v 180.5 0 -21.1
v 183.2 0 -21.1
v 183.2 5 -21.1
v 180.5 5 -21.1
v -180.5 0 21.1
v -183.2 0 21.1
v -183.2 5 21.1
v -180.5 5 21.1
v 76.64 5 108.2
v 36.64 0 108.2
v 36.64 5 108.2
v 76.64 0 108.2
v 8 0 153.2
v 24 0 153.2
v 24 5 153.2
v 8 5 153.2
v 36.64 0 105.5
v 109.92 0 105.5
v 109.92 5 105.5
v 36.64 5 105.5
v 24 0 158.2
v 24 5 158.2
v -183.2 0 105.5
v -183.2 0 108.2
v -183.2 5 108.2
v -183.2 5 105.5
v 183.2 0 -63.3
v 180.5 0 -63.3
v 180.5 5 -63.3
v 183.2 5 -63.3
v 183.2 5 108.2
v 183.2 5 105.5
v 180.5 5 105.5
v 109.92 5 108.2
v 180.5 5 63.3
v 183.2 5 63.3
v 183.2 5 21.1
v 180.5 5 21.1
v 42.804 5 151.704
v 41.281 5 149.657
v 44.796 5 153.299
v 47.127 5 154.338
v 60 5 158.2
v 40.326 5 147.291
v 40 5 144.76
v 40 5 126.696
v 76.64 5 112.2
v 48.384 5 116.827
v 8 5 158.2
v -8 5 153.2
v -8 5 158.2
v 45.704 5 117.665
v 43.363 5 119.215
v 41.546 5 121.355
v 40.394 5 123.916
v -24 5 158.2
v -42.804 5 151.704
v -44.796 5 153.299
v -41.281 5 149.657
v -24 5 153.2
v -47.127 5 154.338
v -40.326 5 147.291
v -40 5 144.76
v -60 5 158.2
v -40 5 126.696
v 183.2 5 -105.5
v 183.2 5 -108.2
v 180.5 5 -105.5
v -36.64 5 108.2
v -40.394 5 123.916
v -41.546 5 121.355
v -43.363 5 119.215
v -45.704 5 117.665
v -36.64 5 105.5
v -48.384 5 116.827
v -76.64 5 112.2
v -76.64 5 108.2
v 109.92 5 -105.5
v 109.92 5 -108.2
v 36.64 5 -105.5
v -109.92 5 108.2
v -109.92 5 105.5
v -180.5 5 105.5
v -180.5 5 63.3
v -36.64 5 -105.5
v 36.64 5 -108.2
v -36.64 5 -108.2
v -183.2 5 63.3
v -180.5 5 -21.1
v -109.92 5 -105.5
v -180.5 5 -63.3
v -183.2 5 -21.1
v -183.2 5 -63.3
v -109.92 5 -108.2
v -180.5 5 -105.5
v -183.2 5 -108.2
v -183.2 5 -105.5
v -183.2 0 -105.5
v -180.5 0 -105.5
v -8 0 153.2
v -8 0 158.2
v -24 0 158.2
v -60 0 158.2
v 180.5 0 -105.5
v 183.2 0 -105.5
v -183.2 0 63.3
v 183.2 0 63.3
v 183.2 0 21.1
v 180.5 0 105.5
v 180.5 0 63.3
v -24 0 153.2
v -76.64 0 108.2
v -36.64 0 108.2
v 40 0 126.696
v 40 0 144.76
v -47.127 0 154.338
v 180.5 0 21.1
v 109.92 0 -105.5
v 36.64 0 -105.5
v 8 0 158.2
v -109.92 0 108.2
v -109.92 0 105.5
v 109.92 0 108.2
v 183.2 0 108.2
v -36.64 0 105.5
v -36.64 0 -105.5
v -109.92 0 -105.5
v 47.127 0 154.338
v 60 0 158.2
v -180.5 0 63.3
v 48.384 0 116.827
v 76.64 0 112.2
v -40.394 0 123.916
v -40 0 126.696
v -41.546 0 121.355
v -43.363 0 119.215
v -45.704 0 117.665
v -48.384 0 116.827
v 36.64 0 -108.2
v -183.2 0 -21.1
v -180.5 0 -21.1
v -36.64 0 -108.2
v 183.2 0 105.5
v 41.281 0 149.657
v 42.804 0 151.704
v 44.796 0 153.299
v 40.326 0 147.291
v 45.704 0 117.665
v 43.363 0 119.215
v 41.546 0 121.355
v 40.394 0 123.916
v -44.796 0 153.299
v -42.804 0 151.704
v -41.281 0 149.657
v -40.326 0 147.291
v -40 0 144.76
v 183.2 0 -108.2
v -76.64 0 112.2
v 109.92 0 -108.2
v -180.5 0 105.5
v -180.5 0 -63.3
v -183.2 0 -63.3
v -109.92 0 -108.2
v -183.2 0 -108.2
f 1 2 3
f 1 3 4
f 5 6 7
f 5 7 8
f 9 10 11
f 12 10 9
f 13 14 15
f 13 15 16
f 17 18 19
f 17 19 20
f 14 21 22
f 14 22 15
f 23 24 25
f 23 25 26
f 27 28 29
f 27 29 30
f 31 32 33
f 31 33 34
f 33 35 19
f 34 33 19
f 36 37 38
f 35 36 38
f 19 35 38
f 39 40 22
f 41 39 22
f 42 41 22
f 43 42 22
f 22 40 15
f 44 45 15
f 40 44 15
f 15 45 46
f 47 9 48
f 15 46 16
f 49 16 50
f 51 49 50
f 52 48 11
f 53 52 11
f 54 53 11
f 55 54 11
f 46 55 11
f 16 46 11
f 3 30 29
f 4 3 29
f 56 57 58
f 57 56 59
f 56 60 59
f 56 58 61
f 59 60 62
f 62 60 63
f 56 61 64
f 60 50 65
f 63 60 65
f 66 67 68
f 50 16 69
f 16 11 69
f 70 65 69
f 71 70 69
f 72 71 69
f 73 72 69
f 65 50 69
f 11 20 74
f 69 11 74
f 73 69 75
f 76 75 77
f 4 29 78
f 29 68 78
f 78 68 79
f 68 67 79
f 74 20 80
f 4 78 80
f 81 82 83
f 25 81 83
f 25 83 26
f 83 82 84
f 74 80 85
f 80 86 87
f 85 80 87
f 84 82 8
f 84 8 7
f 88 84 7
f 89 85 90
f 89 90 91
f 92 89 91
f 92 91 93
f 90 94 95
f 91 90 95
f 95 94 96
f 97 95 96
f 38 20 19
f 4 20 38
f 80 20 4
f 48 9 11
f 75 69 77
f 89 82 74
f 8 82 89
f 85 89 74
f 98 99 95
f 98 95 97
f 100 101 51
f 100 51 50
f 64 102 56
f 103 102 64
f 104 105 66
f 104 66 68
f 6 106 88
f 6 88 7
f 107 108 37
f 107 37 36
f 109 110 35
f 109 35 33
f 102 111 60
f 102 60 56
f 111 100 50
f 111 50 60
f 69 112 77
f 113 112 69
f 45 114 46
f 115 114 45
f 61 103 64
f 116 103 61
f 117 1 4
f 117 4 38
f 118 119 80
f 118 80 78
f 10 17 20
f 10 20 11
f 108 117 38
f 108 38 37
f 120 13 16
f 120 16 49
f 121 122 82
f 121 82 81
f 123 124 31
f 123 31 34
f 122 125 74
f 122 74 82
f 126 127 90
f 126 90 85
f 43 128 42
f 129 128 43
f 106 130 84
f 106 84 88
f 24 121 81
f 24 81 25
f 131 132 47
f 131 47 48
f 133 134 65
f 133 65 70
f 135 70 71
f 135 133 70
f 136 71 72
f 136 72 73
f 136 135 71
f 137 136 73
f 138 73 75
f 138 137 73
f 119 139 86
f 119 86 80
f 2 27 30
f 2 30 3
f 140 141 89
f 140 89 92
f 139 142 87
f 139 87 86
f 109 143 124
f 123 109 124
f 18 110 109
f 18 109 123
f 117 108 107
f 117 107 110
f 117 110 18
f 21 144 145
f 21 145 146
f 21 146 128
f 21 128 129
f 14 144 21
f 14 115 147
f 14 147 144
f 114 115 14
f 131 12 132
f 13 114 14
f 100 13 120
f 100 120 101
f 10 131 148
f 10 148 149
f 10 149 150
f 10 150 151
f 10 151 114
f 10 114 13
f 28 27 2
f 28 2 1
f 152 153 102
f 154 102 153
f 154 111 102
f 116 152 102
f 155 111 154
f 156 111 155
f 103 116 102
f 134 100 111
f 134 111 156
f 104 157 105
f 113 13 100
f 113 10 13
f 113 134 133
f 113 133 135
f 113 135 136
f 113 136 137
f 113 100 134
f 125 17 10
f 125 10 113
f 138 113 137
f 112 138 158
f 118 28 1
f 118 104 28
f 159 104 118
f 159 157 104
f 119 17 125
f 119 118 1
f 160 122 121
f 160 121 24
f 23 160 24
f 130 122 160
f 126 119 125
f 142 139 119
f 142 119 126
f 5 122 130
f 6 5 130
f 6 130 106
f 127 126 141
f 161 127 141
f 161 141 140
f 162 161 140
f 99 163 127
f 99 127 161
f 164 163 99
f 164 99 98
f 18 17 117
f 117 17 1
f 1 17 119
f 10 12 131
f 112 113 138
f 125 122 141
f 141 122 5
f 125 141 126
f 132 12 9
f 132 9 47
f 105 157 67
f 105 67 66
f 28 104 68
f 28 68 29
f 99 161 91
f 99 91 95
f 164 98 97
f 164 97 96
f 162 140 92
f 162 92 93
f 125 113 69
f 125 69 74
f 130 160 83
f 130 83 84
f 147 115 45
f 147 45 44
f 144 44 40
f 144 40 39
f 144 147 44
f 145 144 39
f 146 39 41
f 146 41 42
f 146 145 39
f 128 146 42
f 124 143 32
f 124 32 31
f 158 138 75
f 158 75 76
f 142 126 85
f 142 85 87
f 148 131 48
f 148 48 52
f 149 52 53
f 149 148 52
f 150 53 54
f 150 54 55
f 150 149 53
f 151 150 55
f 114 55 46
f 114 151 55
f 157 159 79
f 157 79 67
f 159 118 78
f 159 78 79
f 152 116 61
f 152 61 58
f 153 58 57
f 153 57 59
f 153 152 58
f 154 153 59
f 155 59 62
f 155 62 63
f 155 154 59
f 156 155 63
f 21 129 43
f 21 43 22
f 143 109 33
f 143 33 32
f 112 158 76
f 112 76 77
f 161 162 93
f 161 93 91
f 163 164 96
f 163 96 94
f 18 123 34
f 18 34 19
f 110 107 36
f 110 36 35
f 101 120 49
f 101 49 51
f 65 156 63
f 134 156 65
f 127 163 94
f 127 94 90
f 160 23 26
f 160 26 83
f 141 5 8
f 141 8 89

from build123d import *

# Parameters (mm, degrees)
BOSS_EXTRUDE1_DEPTH = 5


with BuildPart() as part:
    # Sketch1 → Boss-Extrude1 (new body)
    with BuildSketch(Plane(origin=(0, 0, 0), x_dir=(1, 0, 0), z_dir=(0, 1, 0))):
        with BuildLine():
            Line((-183.2, 108.2), (-109.92, 108.2))
            Line((-109.92, 108.2), (-109.92, 105.5))
            Line((-109.92, 105.5), (-36.64, 105.5))
            Line((-36.64, 105.5), (-36.64, 108.2))
            Line((-36.64, 108.2), (36.64, 108.2))
            Line((36.64, 108.2), (36.64, 105.5))
            Line((36.64, 105.5), (109.92, 105.5))
            Line((109.92, 105.5), (109.92, 108.2))
            Line((109.92, 108.2), (183.2, 108.2))
            Line((183.2, 108.2), (183.2, 105.5))
            Line((183.2, 105.5), (180.5, 105.5))
            Line((180.5, 105.5), (180.5, 63.3))
            Line((180.5, 63.3), (183.2, 63.3))
            Line((183.2, 63.3), (183.2, 21.1))
            Line((183.2, 21.1), (180.5, 21.1))
            Line((180.5, 21.1), (180.5, -21.1))
            Line((180.5, -21.1), (183.2, -21.1))
            Line((183.2, -21.1), (183.2, -63.3))
            Line((183.2, -63.3), (180.5, -63.3))
            Line((180.5, -63.3), (180.5, -105.5))
            Line((180.5, -105.5), (183.2, -105.5))
            Line((183.2, -105.5), (183.2, -108.2))
            Line((183.2, -108.2), (109.92, -108.2))
            Line((109.92, -108.2), (109.92, -105.5))
            Line((109.92, -105.5), (36.64, -105.5))
            Line((36.64, -105.5), (36.64, -108.2))
            Line((36.64, -108.2), (76.64, -108.2))
            Line((76.64, -108.2), (76.64, -112.2))
            Line((76.64, -112.2), (48.383969685, -116.8270792))
            ThreePointArc((48.383969685, -116.8270792), (42.378966502, -120.22108374), (40, -126.695637657))
            Line((40, -126.695637657), (40, -144.759693491))
            ThreePointArc((40, -144.759693491), (41.977070717, -150.728998787), (47.126521144, -154.337956343))
            Line((47.126521144, -154.337956343), (60, -158.2))
            Line((60, -158.2), (40, -158.2))
            Line((40, -158.2), (24, -158.2))
            Line((24, -158.2), (24, -153.2))
            Line((24, -153.2), (8, -153.2))
            Line((8, -153.2), (8, -158.2))
            Line((8, -158.2), (-8, -158.2))
            Line((-8, -158.2), (-8, -153.2))
            Line((-8, -153.2), (-24, -153.2))
            Line((-24, -153.2), (-24, -158.2))
            Line((-24, -158.2), (-40, -158.2))
            Line((-40, -158.2), (-60, -158.2))
            Line((-60, -158.2), (-47.126521144, -154.337956343))
            ThreePointArc((-47.126521144, -154.337956343), (-41.977070717, -150.728998787), (-40, -144.759693491))
            Line((-40, -144.759693491), (-40, -126.695637657))
            ThreePointArc((-40, -126.695637657), (-42.378966502, -120.22108374), (-48.383969685, -116.8270792))
            Line((-48.383969685, -116.8270792), (-76.64, -112.2))
            Line((-76.64, -112.2), (-76.64, -108.2))
            Line((-76.64, -108.2), (-36.64, -108.2))
            Line((-36.64, -108.2), (-36.64, -105.5))
            Line((-36.64, -105.5), (-109.92, -105.5))
            Line((-109.92, -105.5), (-109.92, -108.2))
            Line((-109.92, -108.2), (-183.2, -108.2))
            Line((-183.2, -108.2), (-183.2, -105.5))
            Line((-183.2, -105.5), (-180.5, -105.5))
            Line((-180.5, -105.5), (-180.5, -63.3))
            Line((-180.5, -63.3), (-183.2, -63.3))
            Line((-183.2, -63.3), (-183.2, -21.1))
            Line((-183.2, -21.1), (-180.5, -21.1))
            Line((-180.5, -21.1), (-180.5, 21.1))
            Line((-180.5, 21.1), (-183.2, 21.1))
            Line((-183.2, 21.1), (-183.2, 63.3))
            Line((-183.2, 63.3), (-180.5, 63.3))
            Line((-180.5, 63.3), (-180.5, 105.5))
            Line((-180.5, 105.5), (-183.2, 105.5))
            Line((-183.2, 105.5), (-183.2, 108.2))
        make_face()
    extrude(amount=BOSS_EXTRUDE1_DEPTH)


solid = part.part
